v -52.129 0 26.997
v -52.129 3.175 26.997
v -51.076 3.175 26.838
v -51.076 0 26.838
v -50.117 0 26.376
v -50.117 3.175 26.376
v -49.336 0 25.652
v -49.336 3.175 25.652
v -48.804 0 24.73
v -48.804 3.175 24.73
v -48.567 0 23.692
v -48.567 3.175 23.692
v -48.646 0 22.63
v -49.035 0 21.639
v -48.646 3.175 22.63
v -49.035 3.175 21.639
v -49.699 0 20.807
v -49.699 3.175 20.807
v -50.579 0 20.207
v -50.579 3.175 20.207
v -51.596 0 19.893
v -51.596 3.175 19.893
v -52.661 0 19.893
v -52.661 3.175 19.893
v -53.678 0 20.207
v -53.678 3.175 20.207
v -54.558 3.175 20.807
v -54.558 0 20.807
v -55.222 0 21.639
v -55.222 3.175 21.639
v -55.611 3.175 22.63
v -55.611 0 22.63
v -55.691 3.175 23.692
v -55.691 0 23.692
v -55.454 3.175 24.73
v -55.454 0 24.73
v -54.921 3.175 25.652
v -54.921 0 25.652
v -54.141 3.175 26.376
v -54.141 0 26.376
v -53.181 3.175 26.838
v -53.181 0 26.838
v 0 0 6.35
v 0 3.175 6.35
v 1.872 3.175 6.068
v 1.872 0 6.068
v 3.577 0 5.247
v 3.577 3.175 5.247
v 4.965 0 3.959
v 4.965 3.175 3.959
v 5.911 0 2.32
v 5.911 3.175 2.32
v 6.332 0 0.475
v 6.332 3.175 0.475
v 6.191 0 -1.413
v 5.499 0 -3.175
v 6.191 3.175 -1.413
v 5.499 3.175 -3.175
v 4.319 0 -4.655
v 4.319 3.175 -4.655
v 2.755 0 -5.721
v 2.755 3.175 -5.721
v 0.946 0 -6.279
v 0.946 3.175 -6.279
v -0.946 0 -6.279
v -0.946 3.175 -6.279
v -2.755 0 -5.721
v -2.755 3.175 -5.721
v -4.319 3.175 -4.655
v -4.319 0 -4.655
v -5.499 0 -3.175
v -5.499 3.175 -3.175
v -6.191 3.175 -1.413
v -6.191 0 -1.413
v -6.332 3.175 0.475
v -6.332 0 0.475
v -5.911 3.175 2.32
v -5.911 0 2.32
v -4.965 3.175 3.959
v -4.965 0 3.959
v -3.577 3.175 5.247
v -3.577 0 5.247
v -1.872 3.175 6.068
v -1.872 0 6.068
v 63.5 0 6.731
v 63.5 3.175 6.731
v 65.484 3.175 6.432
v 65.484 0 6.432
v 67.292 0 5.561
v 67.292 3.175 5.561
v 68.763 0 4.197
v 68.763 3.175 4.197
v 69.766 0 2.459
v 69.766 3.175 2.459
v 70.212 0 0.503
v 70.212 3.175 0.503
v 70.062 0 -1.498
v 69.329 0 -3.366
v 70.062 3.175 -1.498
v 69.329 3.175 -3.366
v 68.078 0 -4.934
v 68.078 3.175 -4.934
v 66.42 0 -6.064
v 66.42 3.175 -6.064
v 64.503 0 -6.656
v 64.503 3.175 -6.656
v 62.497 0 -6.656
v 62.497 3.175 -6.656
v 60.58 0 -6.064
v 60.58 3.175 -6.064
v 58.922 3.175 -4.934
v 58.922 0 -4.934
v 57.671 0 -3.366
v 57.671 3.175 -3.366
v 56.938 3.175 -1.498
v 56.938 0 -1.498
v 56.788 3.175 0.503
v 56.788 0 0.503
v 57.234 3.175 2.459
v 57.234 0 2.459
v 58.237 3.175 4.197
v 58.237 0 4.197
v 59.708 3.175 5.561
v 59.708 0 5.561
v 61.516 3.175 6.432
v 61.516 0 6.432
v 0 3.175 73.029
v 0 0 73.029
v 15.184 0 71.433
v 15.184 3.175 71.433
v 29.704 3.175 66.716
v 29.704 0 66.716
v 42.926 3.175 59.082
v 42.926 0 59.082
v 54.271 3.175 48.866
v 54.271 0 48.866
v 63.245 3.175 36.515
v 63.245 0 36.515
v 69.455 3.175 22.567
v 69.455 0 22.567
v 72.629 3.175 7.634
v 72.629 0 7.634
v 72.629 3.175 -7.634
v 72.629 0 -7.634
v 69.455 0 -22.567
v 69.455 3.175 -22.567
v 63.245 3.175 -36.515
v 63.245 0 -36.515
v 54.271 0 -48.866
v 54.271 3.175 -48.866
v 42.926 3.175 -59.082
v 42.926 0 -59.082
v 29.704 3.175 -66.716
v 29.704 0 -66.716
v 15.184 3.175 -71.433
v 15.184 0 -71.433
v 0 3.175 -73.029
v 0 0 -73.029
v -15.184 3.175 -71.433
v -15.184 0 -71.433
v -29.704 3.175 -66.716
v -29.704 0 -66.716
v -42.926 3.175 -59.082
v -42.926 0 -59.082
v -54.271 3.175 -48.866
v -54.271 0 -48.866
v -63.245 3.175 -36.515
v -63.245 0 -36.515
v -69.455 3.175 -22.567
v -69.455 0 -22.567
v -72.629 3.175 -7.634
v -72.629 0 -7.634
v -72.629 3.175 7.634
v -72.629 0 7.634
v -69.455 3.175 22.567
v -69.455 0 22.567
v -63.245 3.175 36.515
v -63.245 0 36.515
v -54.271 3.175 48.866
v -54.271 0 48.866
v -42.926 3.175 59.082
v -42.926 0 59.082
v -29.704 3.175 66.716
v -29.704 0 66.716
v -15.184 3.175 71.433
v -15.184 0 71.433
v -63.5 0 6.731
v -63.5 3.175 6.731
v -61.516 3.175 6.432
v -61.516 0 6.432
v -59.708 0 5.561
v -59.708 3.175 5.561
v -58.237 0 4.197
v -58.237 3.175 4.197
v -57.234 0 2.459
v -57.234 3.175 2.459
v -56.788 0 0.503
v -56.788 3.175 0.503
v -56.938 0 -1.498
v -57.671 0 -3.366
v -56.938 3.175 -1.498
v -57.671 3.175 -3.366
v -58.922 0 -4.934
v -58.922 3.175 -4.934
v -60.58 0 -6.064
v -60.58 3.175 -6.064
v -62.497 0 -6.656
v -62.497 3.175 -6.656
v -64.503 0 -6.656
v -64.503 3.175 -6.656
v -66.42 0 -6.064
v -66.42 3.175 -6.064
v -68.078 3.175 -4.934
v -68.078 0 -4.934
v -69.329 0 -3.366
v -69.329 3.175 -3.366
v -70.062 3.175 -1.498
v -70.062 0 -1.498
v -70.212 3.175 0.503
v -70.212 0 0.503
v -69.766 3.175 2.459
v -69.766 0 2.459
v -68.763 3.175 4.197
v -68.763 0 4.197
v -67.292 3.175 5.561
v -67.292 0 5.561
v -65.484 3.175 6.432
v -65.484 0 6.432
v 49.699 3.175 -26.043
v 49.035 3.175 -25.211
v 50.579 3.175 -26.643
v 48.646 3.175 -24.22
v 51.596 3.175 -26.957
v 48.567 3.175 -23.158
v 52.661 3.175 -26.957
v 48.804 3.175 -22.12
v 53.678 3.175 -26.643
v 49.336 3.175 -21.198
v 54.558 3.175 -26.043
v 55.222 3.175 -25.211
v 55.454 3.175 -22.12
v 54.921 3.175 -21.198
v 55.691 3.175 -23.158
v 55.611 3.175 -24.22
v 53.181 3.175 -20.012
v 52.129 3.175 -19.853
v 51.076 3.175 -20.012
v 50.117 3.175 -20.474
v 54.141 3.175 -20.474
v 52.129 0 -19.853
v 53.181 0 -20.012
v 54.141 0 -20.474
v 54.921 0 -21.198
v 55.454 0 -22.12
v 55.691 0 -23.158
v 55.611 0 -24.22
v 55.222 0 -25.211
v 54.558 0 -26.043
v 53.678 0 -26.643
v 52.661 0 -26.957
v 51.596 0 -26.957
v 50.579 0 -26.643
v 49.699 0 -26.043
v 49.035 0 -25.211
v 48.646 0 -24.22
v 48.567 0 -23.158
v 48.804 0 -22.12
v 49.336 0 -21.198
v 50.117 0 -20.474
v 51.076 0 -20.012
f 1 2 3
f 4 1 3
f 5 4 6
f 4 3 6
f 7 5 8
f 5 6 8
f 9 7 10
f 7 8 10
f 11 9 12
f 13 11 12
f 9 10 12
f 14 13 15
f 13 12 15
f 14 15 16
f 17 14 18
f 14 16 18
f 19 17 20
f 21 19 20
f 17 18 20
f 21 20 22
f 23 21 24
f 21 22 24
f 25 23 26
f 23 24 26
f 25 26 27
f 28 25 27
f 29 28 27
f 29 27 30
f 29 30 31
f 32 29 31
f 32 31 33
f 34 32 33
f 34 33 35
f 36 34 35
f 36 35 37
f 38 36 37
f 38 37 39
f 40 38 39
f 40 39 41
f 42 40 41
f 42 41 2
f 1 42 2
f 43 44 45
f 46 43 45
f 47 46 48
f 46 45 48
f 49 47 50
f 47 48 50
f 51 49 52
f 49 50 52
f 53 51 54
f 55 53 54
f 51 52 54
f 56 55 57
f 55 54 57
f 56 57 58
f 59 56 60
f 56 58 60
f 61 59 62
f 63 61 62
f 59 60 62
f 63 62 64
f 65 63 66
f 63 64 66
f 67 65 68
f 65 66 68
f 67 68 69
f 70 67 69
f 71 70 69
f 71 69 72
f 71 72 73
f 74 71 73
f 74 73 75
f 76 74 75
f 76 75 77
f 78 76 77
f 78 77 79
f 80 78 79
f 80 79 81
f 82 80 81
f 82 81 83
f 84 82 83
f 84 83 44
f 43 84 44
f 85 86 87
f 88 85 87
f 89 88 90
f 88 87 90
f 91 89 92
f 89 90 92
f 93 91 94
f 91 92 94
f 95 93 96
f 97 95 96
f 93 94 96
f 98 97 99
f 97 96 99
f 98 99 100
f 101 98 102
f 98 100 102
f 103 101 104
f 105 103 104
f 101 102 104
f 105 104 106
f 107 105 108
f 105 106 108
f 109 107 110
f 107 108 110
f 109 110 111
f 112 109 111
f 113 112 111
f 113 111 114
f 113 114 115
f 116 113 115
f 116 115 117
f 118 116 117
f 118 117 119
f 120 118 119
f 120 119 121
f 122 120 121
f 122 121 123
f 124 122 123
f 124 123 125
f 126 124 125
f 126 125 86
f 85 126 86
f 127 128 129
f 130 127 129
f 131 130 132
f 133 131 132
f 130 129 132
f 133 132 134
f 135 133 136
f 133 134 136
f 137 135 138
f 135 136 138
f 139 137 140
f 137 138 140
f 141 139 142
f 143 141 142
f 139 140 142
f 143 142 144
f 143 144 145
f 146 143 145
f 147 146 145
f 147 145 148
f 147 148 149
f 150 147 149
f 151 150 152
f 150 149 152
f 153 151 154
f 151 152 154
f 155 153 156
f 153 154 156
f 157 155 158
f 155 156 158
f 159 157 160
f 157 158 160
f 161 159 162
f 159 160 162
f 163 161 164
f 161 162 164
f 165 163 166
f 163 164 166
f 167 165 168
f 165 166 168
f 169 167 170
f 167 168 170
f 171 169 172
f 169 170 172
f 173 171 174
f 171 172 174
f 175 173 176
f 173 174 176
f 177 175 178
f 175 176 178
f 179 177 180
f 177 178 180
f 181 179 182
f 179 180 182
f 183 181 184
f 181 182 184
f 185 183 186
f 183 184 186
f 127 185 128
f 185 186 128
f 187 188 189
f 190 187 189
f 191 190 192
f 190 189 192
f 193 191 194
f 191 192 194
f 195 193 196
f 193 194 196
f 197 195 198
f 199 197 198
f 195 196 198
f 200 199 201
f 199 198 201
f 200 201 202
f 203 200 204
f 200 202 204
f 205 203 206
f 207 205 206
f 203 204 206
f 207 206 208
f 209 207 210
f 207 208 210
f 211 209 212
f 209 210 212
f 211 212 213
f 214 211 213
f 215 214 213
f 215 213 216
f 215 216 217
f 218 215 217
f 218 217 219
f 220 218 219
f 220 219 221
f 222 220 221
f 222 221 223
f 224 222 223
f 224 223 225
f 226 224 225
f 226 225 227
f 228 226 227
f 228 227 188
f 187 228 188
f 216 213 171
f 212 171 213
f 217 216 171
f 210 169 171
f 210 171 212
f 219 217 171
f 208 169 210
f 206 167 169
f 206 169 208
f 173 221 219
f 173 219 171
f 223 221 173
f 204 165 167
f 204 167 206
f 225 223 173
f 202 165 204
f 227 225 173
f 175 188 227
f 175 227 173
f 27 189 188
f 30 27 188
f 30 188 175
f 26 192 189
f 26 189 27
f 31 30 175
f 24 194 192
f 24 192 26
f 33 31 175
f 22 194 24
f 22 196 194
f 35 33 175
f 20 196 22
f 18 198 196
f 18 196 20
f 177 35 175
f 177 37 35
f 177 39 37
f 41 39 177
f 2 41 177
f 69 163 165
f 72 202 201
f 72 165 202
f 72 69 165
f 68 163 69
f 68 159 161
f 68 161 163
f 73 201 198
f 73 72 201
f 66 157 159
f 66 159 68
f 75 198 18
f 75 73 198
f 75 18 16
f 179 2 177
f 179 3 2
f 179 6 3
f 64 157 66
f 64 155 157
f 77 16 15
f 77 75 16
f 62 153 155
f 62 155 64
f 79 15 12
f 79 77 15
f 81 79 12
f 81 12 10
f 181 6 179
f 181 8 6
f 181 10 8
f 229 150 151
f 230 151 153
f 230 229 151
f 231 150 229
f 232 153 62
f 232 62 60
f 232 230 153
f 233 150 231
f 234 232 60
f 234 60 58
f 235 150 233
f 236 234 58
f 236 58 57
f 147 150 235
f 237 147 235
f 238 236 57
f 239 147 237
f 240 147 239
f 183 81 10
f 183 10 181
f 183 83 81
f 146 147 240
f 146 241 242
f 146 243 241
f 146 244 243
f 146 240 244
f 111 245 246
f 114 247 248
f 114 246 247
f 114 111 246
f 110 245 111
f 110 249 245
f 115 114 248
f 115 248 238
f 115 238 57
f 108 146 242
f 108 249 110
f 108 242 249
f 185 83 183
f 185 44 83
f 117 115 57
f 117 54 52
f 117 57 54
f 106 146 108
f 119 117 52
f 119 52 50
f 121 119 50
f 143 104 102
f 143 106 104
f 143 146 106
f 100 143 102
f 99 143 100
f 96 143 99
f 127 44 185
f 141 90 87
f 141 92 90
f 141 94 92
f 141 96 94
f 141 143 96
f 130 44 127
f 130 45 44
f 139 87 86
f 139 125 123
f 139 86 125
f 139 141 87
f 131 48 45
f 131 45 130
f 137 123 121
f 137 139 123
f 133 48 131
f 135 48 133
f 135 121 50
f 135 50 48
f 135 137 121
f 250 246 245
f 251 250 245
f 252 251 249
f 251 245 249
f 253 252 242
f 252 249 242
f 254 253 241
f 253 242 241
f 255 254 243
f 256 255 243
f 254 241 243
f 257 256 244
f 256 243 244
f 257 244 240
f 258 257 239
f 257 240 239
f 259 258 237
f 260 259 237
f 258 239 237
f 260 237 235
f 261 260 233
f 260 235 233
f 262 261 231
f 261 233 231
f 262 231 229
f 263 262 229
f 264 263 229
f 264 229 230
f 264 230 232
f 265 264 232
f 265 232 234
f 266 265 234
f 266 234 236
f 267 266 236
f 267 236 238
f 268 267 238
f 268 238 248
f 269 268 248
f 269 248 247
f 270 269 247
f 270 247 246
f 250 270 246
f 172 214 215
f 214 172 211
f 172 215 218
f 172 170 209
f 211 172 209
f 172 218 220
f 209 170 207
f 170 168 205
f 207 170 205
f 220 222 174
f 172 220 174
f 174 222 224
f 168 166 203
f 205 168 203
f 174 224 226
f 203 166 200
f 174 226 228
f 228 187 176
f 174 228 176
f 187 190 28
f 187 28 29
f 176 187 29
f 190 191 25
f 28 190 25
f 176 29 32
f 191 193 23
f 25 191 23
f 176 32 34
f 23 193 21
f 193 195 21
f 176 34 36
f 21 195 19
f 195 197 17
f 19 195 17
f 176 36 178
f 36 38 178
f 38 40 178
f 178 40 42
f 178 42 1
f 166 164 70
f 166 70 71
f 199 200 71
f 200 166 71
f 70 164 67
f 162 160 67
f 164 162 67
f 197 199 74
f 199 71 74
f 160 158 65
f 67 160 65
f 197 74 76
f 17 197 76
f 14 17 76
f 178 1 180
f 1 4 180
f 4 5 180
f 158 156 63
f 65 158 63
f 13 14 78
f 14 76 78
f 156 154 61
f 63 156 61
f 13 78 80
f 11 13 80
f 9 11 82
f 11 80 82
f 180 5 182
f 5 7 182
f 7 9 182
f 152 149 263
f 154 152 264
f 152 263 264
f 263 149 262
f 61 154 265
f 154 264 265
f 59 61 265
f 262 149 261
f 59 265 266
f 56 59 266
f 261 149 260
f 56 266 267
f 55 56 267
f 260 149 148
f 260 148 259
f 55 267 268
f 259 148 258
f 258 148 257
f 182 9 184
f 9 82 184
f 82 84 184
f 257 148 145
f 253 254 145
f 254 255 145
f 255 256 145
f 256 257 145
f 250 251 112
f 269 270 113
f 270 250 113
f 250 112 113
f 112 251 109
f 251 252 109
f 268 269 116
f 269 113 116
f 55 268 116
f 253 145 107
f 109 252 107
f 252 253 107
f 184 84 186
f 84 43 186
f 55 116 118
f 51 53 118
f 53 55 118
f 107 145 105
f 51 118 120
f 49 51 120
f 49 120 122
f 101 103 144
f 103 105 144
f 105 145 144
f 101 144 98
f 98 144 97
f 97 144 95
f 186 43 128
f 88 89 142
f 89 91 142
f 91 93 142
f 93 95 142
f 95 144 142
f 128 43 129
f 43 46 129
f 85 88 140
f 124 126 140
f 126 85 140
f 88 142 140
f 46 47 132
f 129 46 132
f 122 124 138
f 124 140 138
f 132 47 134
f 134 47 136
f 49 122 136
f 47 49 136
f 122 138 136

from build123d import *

# Parameters (mm, degrees)
SKETCH1_R           = 73.029292346
BOSS_EXTRUDE1_DEPTH = 3.175
SKETCH8_R           = 6.35
CUT_EXTRUDE3_DEPTH  = 16.256
SKETCH10_R          = 6.731
CUT_EXTRUDE4_DEPTH  = 25.4
SKETCH11_R          = 3.571875
CUT_EXTRUDE5_DEPTH  = 254


with BuildPart() as part:
    # Sketch1 → Boss-Extrude1 (new body)
    with BuildSketch(Plane(origin=(0, 0, 0), x_dir=(1, 0, 0), z_dir=(0, 1, 0))):
        with Locations(Location((0, 0, 0), (0, 0, 270))):
            Circle(SKETCH1_R)
    extrude(amount=BOSS_EXTRUDE1_DEPTH)

    # Sketch8 → Cut-Extrude3 (cut)
    with BuildSketch(Plane(origin=(0, 3.175, 0), x_dir=(1, 0, 0), z_dir=(0, 1, 0))):
        with Locations(Location((0, 0, 0), (0, 0, 270))):
            Circle(SKETCH8_R)
    extrude(amount=-CUT_EXTRUDE3_DEPTH, mode=Mode.SUBTRACT)

    # Sketch10 → Cut-Extrude4 (cut)
    with BuildSketch(Plane(origin=(0, 3.175, 0), x_dir=(1, 0, 0), z_dir=(0, 1, 0))):
        with Locations(Location((-63.5, 0, 0), (0, 0, 270))):
            Circle(SKETCH10_R)
        with Locations(Location((63.5, 0, 0), (0, 0, 270))):
            Circle(SKETCH10_R)
    extrude(amount=-CUT_EXTRUDE4_DEPTH, mode=Mode.SUBTRACT)

    # Sketch11 → Cut-Extrude5 (cut)
    with BuildSketch(Plane(origin=(0, 3.175, 0), x_dir=(1, 0, 0), z_dir=(0, 1, 0))):
        with Locations(Location((-52.128653384, -23.424901204, 0), (0, 0, 270))):
            Circle(SKETCH11_R)
        with Locations(Location((52.128653384, 23.424901204, 0), (0, 0, 270))):
            Circle(SKETCH11_R)
    extrude(amount=-CUT_EXTRUDE5_DEPTH, mode=Mode.SUBTRACT)


solid = part.part
